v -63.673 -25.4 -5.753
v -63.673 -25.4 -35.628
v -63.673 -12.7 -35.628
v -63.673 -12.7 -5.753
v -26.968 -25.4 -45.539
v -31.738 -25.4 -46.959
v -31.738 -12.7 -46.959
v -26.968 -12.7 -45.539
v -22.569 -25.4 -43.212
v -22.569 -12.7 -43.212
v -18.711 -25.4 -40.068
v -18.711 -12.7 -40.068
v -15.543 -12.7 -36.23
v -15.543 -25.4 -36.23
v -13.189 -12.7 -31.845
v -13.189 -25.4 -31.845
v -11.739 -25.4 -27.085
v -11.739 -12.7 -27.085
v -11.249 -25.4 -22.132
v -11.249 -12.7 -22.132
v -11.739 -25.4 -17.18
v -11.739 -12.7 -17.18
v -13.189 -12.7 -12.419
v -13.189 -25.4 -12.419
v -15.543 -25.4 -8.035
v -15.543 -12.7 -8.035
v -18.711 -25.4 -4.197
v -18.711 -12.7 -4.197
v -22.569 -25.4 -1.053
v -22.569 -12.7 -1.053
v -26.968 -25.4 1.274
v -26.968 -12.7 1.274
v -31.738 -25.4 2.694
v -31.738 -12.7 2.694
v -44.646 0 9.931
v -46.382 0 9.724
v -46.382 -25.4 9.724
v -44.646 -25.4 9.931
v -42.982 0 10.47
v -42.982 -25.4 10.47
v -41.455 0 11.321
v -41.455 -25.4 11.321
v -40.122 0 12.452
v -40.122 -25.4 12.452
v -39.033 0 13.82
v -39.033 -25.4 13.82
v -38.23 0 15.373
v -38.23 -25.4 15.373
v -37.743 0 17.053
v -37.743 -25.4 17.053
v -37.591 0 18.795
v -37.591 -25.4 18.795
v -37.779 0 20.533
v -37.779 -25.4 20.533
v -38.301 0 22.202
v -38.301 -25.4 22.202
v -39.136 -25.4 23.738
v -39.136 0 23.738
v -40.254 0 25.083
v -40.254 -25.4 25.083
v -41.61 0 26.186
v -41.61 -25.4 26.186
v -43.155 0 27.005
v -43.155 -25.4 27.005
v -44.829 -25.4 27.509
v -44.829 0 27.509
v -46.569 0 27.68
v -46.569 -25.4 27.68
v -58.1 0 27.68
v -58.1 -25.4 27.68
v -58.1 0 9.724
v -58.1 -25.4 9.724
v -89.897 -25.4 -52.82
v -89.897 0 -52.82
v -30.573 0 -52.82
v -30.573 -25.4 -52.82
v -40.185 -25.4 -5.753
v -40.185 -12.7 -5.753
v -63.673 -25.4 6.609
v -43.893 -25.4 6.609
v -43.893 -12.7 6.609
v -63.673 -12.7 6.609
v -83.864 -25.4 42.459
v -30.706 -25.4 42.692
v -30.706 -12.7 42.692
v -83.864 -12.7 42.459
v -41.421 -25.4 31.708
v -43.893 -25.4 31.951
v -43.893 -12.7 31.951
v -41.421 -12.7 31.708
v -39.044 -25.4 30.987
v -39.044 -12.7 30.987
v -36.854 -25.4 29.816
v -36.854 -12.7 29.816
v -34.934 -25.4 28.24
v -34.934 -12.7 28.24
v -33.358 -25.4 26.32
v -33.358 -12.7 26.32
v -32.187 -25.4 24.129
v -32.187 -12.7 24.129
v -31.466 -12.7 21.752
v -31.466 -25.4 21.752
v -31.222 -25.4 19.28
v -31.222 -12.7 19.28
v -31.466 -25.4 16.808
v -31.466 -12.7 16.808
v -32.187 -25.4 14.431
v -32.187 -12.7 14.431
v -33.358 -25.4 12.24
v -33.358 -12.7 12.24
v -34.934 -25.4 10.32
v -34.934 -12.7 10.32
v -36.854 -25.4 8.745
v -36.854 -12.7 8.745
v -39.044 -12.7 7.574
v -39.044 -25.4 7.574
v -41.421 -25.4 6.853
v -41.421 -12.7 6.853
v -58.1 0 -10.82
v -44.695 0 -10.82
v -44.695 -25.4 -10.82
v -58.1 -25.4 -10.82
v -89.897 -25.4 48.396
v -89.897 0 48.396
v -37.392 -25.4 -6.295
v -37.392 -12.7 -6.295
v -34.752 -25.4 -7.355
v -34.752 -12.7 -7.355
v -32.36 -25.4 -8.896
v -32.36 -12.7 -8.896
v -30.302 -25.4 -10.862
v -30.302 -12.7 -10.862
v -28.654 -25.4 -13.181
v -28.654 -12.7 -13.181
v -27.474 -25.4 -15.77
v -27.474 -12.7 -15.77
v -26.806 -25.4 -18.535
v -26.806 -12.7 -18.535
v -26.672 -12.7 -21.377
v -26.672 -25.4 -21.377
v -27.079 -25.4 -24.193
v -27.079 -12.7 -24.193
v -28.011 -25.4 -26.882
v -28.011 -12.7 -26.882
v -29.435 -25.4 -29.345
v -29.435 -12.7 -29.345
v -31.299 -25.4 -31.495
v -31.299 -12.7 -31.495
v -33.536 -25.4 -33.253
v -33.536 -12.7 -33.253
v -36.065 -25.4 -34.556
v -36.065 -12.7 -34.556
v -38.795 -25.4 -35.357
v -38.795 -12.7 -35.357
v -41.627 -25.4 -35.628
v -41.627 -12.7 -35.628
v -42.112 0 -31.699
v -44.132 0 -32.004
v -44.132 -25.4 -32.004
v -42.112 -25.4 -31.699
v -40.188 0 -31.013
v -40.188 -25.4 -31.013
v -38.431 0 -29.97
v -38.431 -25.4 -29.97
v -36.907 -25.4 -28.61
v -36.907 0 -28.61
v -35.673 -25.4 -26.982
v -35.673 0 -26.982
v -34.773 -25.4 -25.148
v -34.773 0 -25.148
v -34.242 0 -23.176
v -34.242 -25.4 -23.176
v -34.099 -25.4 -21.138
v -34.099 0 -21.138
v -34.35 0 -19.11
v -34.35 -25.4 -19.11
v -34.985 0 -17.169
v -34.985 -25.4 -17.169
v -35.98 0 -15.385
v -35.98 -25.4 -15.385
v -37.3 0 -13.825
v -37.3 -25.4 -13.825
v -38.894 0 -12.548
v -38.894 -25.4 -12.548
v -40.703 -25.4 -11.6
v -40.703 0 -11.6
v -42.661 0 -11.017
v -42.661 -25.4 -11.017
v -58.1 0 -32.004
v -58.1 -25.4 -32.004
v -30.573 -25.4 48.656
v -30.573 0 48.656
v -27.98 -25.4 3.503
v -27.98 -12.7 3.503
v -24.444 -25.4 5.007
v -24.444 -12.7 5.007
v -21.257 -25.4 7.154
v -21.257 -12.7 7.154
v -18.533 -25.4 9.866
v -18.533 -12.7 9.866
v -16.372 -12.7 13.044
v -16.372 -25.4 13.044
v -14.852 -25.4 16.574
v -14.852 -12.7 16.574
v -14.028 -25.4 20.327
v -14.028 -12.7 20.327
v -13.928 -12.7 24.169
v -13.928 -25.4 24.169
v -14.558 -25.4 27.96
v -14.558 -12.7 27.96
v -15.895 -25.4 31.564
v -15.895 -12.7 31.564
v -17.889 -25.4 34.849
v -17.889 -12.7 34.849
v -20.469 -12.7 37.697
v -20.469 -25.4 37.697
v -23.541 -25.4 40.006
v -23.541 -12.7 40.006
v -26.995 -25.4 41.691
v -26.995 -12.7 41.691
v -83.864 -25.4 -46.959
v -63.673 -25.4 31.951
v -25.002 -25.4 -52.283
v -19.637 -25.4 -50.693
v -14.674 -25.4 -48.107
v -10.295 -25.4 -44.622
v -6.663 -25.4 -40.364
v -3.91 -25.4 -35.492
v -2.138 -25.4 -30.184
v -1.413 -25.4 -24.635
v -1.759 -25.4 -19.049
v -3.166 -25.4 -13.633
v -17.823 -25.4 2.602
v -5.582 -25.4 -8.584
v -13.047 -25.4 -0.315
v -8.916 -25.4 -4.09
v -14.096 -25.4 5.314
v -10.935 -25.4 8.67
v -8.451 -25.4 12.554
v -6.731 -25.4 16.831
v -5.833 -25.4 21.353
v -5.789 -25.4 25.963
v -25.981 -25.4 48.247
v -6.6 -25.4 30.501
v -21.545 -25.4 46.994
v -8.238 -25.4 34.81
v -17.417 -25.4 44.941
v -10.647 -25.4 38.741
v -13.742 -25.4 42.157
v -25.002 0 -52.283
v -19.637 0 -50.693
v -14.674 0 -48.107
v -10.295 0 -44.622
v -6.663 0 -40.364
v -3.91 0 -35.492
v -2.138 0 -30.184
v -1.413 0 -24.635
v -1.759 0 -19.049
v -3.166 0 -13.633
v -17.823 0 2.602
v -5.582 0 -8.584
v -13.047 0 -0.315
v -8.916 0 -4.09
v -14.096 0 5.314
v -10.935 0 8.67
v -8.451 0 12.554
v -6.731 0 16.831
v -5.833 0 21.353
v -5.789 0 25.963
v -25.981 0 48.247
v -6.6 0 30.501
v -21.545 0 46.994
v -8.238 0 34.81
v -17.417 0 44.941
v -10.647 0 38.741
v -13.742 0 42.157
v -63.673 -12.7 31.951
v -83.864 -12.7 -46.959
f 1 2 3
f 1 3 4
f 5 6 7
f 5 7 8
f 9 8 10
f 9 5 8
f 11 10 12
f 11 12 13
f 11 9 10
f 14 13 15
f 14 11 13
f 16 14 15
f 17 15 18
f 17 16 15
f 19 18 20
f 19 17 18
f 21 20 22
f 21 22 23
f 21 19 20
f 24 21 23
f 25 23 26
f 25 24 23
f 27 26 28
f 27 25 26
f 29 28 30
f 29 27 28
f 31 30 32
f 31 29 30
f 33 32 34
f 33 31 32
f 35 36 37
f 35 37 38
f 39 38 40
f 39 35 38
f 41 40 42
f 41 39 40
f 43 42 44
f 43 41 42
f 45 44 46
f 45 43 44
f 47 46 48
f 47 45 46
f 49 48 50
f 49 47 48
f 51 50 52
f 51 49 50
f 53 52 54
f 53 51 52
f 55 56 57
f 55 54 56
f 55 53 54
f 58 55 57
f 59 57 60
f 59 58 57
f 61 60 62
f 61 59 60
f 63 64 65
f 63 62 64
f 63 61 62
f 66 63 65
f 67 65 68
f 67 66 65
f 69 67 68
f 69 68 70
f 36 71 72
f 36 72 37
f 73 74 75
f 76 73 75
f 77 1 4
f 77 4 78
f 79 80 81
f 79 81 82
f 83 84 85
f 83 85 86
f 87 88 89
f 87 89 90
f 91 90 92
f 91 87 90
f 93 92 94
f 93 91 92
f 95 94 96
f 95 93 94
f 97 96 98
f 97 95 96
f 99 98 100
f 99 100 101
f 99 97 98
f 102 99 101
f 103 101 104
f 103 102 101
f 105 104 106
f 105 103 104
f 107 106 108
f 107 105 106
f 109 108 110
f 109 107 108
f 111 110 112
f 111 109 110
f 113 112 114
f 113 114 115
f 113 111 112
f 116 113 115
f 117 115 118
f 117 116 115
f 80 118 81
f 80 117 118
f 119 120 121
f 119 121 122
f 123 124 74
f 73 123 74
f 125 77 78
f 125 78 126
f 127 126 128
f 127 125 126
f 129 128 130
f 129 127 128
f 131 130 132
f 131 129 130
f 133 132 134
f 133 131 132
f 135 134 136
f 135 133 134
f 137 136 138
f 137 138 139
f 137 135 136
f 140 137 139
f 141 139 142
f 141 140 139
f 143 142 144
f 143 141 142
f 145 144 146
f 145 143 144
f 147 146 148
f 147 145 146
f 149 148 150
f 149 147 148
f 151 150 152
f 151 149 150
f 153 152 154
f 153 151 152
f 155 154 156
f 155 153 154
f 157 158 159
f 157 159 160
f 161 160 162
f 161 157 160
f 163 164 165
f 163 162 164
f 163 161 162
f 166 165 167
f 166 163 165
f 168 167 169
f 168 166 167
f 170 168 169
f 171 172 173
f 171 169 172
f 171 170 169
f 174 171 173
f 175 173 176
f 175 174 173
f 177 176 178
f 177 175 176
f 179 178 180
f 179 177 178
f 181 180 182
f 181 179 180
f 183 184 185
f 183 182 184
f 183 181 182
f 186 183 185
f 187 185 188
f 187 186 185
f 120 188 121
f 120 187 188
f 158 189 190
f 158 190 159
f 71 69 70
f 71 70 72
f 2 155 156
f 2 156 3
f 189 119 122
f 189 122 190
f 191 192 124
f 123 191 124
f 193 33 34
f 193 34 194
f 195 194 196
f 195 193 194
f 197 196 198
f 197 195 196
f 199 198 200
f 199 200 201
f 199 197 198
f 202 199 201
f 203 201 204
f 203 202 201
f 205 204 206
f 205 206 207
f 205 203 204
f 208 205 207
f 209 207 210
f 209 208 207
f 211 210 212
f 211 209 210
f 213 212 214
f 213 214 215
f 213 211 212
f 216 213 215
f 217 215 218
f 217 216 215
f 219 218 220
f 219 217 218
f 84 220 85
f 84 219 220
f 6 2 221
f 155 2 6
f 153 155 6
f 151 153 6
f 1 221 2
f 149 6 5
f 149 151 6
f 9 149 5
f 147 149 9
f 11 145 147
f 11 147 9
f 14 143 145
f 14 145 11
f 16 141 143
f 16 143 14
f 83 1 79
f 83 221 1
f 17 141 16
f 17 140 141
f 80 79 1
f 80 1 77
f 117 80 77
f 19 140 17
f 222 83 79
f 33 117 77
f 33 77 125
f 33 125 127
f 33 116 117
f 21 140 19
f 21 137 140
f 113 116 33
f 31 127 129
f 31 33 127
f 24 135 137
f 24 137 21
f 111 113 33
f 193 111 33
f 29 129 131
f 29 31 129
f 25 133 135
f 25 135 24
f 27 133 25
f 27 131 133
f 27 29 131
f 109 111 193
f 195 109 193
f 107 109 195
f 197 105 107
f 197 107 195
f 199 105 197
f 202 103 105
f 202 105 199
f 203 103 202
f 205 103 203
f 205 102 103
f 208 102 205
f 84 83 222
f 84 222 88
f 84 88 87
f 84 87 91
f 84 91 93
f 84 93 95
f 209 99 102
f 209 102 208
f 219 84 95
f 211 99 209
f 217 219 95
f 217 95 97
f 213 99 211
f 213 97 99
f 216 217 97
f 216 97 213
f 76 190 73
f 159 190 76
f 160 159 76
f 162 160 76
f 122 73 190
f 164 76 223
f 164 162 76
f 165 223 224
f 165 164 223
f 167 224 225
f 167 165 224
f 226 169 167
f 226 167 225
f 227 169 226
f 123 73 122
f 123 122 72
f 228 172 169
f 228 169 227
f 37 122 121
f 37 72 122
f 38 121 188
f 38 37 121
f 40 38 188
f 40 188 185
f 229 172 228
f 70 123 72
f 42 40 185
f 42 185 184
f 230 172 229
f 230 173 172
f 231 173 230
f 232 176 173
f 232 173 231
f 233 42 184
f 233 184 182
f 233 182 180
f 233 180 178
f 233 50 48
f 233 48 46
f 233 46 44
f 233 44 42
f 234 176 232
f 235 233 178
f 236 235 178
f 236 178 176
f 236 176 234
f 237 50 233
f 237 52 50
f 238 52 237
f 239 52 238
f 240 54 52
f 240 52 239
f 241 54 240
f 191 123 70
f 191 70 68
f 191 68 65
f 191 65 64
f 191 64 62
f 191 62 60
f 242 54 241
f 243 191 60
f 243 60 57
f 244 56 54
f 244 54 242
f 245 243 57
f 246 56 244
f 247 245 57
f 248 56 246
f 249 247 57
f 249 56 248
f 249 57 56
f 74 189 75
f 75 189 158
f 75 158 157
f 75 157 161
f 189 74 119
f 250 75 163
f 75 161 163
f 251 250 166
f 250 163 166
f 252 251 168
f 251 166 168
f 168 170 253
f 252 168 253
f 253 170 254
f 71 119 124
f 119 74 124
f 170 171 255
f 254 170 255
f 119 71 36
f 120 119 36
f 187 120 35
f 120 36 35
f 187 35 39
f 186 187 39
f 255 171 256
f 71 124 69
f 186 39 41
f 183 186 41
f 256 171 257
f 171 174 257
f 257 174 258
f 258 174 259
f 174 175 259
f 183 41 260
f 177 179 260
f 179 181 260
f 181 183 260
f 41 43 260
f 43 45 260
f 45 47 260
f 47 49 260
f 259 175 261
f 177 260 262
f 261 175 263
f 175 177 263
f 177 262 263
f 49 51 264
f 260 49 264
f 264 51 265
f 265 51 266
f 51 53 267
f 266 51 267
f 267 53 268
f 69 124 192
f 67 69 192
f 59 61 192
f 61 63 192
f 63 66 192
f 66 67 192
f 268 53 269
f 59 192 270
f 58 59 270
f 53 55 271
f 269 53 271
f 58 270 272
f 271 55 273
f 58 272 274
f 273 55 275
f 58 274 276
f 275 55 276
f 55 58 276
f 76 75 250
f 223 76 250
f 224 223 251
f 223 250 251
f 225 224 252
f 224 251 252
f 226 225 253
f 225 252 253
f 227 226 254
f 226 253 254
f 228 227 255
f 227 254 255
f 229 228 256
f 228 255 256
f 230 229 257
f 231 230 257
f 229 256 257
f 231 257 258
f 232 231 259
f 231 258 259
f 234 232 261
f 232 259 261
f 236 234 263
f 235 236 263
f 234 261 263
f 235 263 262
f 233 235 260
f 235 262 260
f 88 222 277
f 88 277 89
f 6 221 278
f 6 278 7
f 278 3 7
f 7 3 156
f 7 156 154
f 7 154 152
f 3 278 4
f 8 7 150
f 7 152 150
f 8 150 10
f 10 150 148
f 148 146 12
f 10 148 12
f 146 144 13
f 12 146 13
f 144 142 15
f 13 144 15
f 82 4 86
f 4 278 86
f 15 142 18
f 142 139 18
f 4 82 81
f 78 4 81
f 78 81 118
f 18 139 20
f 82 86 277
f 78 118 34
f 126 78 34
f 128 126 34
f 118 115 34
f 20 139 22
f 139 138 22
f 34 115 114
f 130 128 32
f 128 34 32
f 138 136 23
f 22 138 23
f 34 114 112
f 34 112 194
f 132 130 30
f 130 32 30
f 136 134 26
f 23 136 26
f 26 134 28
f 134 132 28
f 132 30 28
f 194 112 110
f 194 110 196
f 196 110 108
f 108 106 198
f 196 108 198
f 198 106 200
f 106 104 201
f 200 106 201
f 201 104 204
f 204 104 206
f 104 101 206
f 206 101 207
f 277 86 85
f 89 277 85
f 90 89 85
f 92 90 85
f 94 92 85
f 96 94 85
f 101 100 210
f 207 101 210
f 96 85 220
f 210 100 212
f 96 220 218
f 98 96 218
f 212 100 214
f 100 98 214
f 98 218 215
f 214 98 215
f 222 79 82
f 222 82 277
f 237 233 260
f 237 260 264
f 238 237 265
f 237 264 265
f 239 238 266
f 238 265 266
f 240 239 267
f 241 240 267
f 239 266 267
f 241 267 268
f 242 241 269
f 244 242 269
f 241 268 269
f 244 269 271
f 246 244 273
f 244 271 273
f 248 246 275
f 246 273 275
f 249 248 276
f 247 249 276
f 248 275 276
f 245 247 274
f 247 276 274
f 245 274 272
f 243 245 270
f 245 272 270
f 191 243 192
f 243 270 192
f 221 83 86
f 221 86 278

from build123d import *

# Parameters (mm, degrees)
F1_DEPTH = 25.4
F3_DEPTH = 25.4
F4_DEPTH = 53.848
F6_DEPTH = 12.7


with BuildPart() as f1:
    # F0 (on Front) → F1 (new body)
    with BuildSketch(Plane.XZ):
        with BuildLine():
            Line((-30.572927, 48.65649), (-89.897417, 48.396293))
            Line((-89.897417, 48.396293), (-89.897417, -52.819613))
            Line((-89.897417, -52.819613), (-30.572927, -52.819613))
            ThreePointArc((-30.572927, -52.819613), (-2.138348, -30.18362), (-17.823366, 2.601951))
            ThreePointArc((-17.823366, 2.601951), (-6.599701, 30.501106), (-30.572927, 48.65649))
        make_face()
    extrude(amount=F1_DEPTH)

    # F2 (on face) → F3 (cut)
    with BuildSketch(Plane.XZ):
        with BuildLine():
            Line((-46.569277, 27.679665), (-58.099557, 27.679665))
            Line((-58.099557, 27.679665), (-58.099557, 9.724027))
            Line((-58.099557, 9.724027), (-46.381809, 9.724027))
            ThreePointArc((-46.381809, 9.724027), (-37.590968, 18.794606), (-46.569277, 27.679665))
        make_face()
        with BuildLine():
            Line((-44.694602, -10.819801), (-58.099557, -10.819801))
            Line((-58.099557, -10.819801), (-58.099557, -32.003619))
            Line((-58.099557, -32.003619), (-44.132199, -32.003619))
            ThreePointArc((-44.132199, -32.003619), (-34.098962, -21.137875), (-44.694602, -10.819801))
        make_face()
    extrude(amount=-F3_DEPTH, mode=Mode.SUBTRACT)

    # F2 (on face) → F4 (cut)
    with BuildSketch(Plane.XZ):
        with BuildLine():
            Line((-46.569277, 27.679665), (-58.099557, 27.679665))
            Line((-58.099557, 27.679665), (-58.099557, 9.724027))
            Line((-58.099557, 9.724027), (-46.381809, 9.724027))
            ThreePointArc((-46.381809, 9.724027), (-37.590968, 18.794606), (-46.569277, 27.679665))
        make_face()
        with BuildLine():
            Line((-44.694602, -10.819801), (-58.099557, -10.819801))
            Line((-58.099557, -10.819801), (-58.099557, -32.003619))
            Line((-58.099557, -32.003619), (-44.132199, -32.003619))
            ThreePointArc((-44.132199, -32.003619), (-34.098962, -21.137875), (-44.694602, -10.819801))
        make_face()
    extrude(amount=F4_DEPTH, mode=Mode.SUBTRACT)


with BuildPart() as f6:
    # F5 (on face) → F6 (new body)
    with BuildSketch(Plane.XZ.offset(25.4)):
        with BuildLine():
            Line((-30.705677, 42.691864), (-83.86372, 42.458713))
            Line((-83.86372, 42.458713), (-83.86372, -46.959333))
            Line((-83.86372, -46.959333), (-31.737529, -46.959333))
            ThreePointArc((-31.737529, -46.959333), (-11.249094, -22.132434), (-31.737529, 2.694466))
            ThreePointArc((-31.737529, 2.694466), (-13.8865, 22.245954), (-30.705677, 42.691864))
        make_face()
        with BuildLine():
            Line((-41.627079, -35.627555), (-63.672543, -35.627555))
            Line((-63.672543, -35.627555), (-63.672543, -5.752861))
            Line((-63.672543, -5.752861), (-40.184855, -5.752861))
            ThreePointArc((-40.184855, -5.752861), (-26.672336, -21.377348), (-41.627079, -35.627555))
        make_face(mode=Mode.SUBTRACT)
        with BuildLine():
            Line((-63.672543, 6.609081), (-63.672543, 31.951062))
            Line((-63.672543, 31.951062), (-43.893438, 31.951062))
            ThreePointArc((-43.893438, 31.951062), (-31.222447, 19.280072), (-43.893438, 6.609081))
            Line((-43.893438, 6.609081), (-63.672543, 6.609081))
        make_face(mode=Mode.SUBTRACT)
    extrude(amount=-F6_DEPTH)


solid = Compound([f1.part, f6.part])
